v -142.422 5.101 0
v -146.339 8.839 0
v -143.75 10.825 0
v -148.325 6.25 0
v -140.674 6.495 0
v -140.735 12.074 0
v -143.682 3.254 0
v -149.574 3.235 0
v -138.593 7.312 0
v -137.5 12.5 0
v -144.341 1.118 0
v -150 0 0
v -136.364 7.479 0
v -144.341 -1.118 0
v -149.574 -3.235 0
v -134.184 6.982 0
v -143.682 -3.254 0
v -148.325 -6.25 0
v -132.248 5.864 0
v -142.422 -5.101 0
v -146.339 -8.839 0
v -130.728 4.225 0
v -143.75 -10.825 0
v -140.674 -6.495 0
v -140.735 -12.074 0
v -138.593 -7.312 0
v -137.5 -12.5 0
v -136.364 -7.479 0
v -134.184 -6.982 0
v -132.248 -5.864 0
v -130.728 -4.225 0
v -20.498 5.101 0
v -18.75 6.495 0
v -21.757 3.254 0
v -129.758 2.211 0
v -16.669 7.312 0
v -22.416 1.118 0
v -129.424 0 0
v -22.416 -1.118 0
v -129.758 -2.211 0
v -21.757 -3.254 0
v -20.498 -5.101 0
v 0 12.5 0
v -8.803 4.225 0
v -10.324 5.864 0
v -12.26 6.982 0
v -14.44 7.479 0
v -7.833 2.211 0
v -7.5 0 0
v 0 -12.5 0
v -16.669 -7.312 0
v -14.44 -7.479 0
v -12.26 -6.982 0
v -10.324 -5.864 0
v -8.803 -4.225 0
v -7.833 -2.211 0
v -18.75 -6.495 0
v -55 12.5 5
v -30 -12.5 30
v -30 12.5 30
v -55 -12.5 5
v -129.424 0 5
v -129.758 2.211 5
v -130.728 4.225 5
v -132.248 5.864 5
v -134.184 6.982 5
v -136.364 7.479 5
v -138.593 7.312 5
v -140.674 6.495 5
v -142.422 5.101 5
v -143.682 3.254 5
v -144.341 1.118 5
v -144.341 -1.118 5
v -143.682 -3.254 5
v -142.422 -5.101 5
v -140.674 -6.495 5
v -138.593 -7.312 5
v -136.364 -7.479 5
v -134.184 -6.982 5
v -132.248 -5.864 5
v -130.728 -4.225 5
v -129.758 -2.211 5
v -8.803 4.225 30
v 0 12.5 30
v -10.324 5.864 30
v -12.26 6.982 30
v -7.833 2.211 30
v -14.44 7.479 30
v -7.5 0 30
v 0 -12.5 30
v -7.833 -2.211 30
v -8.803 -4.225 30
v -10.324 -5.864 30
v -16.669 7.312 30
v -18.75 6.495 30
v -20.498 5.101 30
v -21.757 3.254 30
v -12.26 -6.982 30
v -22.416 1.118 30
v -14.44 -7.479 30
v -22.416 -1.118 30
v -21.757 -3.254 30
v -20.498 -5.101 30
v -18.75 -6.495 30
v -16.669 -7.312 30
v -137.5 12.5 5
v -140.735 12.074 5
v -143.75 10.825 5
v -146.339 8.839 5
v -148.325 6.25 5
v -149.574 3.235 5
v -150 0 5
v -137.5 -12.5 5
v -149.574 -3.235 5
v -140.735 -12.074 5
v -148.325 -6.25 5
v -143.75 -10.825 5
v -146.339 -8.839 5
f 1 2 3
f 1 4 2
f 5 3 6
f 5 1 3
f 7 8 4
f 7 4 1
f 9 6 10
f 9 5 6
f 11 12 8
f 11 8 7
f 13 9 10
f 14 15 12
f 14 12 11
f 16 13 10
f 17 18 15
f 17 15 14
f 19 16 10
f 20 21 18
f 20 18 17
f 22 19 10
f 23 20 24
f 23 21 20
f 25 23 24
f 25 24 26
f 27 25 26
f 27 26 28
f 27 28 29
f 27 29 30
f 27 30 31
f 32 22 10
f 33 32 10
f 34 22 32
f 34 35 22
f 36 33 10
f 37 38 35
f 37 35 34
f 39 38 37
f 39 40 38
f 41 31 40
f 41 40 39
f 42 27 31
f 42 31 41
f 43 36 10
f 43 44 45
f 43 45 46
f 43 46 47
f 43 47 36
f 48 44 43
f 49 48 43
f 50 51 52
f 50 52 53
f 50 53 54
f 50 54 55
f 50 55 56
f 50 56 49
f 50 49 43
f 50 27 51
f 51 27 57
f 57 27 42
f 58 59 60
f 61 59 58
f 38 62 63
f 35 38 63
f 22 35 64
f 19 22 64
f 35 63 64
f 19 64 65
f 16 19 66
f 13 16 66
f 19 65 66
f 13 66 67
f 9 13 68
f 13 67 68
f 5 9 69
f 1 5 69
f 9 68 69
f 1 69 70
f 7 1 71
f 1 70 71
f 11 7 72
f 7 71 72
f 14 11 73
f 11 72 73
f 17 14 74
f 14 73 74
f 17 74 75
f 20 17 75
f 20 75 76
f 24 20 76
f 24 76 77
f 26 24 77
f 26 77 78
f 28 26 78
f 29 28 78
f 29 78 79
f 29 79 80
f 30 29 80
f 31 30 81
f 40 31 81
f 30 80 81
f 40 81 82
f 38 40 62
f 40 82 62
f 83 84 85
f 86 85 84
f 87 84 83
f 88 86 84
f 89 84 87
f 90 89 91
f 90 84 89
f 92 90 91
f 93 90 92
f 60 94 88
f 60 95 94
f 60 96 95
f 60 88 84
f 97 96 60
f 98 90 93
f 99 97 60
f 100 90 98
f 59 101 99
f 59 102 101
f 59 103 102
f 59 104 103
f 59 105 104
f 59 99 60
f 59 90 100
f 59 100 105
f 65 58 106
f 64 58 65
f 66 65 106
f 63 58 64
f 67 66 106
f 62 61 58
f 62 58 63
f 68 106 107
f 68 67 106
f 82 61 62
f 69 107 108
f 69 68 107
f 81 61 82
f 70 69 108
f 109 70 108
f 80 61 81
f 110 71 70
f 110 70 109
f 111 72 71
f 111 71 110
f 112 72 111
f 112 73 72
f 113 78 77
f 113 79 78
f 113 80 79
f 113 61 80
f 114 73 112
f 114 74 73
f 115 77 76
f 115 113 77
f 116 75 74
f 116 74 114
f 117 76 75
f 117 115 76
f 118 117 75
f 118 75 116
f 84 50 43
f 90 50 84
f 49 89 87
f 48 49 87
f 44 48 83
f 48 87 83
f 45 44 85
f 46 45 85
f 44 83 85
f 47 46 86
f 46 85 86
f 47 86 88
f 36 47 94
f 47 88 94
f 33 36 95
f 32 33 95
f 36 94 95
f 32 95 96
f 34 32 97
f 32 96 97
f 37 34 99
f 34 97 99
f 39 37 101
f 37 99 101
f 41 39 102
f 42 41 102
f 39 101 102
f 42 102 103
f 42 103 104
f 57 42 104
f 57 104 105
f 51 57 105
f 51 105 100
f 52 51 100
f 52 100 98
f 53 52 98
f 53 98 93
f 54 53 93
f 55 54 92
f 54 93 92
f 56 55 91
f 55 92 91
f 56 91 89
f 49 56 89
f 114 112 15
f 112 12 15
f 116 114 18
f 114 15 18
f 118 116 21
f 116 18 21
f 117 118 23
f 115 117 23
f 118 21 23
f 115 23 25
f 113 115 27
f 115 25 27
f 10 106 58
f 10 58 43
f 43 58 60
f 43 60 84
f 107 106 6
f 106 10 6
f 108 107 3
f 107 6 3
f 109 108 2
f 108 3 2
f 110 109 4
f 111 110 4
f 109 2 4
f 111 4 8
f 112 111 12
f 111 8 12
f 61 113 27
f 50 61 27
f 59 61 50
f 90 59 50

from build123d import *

# Parameters (mm, degrees)
F1_DEPTH = 12.5
F2_R     = 7.5
F3_DEPTH = 30
F5_R     = 12.49999
F4_R     = 7.5
F6_DEPTH = 5


# Not quite as in the source:
# - a fillet or chamfer is up to 0.001 mm smaller than in the source, because OpenCascade refuses the exact size


with BuildPart() as f1:
    # F0 (on Front) → F1 (new body, symmetric)
    with BuildSketch(Plane.XZ):
        Polygon((-150, 0), (0, 0), (0, 30), (-30, 30), (-55, 5), (-150, 5), align=None)
    extrude(amount=F1_DEPTH, both=True)

    # F2 (on face) → F3 (cut, through all)
    with BuildSketch(Plane.XY.offset(30)):
        with Locations((-15, 0)):
            Circle(F2_R)
    extrude(amount=-F3_DEPTH, mode=Mode.SUBTRACT)

    # F5 (radius 12.5 in the source; OpenCascade refuses exactly that, so slightly less here)
    f5_edges = [f1.edges().sort_by_distance(p)[0] for p in [
        (-150, 12.5, 2.5),
        (-150, -12.5, 2.5),
    ]]
    fillet(f5_edges, radius=F5_R)

    # F4 (on face) → F6 (cut, through all)
    with BuildSketch(Plane.XY.offset(5)):
        with Locations((-136.9243115187, 0)):
            Circle(F4_R)
    extrude(amount=-F6_DEPTH, mode=Mode.SUBTRACT)


solid = f1.part
